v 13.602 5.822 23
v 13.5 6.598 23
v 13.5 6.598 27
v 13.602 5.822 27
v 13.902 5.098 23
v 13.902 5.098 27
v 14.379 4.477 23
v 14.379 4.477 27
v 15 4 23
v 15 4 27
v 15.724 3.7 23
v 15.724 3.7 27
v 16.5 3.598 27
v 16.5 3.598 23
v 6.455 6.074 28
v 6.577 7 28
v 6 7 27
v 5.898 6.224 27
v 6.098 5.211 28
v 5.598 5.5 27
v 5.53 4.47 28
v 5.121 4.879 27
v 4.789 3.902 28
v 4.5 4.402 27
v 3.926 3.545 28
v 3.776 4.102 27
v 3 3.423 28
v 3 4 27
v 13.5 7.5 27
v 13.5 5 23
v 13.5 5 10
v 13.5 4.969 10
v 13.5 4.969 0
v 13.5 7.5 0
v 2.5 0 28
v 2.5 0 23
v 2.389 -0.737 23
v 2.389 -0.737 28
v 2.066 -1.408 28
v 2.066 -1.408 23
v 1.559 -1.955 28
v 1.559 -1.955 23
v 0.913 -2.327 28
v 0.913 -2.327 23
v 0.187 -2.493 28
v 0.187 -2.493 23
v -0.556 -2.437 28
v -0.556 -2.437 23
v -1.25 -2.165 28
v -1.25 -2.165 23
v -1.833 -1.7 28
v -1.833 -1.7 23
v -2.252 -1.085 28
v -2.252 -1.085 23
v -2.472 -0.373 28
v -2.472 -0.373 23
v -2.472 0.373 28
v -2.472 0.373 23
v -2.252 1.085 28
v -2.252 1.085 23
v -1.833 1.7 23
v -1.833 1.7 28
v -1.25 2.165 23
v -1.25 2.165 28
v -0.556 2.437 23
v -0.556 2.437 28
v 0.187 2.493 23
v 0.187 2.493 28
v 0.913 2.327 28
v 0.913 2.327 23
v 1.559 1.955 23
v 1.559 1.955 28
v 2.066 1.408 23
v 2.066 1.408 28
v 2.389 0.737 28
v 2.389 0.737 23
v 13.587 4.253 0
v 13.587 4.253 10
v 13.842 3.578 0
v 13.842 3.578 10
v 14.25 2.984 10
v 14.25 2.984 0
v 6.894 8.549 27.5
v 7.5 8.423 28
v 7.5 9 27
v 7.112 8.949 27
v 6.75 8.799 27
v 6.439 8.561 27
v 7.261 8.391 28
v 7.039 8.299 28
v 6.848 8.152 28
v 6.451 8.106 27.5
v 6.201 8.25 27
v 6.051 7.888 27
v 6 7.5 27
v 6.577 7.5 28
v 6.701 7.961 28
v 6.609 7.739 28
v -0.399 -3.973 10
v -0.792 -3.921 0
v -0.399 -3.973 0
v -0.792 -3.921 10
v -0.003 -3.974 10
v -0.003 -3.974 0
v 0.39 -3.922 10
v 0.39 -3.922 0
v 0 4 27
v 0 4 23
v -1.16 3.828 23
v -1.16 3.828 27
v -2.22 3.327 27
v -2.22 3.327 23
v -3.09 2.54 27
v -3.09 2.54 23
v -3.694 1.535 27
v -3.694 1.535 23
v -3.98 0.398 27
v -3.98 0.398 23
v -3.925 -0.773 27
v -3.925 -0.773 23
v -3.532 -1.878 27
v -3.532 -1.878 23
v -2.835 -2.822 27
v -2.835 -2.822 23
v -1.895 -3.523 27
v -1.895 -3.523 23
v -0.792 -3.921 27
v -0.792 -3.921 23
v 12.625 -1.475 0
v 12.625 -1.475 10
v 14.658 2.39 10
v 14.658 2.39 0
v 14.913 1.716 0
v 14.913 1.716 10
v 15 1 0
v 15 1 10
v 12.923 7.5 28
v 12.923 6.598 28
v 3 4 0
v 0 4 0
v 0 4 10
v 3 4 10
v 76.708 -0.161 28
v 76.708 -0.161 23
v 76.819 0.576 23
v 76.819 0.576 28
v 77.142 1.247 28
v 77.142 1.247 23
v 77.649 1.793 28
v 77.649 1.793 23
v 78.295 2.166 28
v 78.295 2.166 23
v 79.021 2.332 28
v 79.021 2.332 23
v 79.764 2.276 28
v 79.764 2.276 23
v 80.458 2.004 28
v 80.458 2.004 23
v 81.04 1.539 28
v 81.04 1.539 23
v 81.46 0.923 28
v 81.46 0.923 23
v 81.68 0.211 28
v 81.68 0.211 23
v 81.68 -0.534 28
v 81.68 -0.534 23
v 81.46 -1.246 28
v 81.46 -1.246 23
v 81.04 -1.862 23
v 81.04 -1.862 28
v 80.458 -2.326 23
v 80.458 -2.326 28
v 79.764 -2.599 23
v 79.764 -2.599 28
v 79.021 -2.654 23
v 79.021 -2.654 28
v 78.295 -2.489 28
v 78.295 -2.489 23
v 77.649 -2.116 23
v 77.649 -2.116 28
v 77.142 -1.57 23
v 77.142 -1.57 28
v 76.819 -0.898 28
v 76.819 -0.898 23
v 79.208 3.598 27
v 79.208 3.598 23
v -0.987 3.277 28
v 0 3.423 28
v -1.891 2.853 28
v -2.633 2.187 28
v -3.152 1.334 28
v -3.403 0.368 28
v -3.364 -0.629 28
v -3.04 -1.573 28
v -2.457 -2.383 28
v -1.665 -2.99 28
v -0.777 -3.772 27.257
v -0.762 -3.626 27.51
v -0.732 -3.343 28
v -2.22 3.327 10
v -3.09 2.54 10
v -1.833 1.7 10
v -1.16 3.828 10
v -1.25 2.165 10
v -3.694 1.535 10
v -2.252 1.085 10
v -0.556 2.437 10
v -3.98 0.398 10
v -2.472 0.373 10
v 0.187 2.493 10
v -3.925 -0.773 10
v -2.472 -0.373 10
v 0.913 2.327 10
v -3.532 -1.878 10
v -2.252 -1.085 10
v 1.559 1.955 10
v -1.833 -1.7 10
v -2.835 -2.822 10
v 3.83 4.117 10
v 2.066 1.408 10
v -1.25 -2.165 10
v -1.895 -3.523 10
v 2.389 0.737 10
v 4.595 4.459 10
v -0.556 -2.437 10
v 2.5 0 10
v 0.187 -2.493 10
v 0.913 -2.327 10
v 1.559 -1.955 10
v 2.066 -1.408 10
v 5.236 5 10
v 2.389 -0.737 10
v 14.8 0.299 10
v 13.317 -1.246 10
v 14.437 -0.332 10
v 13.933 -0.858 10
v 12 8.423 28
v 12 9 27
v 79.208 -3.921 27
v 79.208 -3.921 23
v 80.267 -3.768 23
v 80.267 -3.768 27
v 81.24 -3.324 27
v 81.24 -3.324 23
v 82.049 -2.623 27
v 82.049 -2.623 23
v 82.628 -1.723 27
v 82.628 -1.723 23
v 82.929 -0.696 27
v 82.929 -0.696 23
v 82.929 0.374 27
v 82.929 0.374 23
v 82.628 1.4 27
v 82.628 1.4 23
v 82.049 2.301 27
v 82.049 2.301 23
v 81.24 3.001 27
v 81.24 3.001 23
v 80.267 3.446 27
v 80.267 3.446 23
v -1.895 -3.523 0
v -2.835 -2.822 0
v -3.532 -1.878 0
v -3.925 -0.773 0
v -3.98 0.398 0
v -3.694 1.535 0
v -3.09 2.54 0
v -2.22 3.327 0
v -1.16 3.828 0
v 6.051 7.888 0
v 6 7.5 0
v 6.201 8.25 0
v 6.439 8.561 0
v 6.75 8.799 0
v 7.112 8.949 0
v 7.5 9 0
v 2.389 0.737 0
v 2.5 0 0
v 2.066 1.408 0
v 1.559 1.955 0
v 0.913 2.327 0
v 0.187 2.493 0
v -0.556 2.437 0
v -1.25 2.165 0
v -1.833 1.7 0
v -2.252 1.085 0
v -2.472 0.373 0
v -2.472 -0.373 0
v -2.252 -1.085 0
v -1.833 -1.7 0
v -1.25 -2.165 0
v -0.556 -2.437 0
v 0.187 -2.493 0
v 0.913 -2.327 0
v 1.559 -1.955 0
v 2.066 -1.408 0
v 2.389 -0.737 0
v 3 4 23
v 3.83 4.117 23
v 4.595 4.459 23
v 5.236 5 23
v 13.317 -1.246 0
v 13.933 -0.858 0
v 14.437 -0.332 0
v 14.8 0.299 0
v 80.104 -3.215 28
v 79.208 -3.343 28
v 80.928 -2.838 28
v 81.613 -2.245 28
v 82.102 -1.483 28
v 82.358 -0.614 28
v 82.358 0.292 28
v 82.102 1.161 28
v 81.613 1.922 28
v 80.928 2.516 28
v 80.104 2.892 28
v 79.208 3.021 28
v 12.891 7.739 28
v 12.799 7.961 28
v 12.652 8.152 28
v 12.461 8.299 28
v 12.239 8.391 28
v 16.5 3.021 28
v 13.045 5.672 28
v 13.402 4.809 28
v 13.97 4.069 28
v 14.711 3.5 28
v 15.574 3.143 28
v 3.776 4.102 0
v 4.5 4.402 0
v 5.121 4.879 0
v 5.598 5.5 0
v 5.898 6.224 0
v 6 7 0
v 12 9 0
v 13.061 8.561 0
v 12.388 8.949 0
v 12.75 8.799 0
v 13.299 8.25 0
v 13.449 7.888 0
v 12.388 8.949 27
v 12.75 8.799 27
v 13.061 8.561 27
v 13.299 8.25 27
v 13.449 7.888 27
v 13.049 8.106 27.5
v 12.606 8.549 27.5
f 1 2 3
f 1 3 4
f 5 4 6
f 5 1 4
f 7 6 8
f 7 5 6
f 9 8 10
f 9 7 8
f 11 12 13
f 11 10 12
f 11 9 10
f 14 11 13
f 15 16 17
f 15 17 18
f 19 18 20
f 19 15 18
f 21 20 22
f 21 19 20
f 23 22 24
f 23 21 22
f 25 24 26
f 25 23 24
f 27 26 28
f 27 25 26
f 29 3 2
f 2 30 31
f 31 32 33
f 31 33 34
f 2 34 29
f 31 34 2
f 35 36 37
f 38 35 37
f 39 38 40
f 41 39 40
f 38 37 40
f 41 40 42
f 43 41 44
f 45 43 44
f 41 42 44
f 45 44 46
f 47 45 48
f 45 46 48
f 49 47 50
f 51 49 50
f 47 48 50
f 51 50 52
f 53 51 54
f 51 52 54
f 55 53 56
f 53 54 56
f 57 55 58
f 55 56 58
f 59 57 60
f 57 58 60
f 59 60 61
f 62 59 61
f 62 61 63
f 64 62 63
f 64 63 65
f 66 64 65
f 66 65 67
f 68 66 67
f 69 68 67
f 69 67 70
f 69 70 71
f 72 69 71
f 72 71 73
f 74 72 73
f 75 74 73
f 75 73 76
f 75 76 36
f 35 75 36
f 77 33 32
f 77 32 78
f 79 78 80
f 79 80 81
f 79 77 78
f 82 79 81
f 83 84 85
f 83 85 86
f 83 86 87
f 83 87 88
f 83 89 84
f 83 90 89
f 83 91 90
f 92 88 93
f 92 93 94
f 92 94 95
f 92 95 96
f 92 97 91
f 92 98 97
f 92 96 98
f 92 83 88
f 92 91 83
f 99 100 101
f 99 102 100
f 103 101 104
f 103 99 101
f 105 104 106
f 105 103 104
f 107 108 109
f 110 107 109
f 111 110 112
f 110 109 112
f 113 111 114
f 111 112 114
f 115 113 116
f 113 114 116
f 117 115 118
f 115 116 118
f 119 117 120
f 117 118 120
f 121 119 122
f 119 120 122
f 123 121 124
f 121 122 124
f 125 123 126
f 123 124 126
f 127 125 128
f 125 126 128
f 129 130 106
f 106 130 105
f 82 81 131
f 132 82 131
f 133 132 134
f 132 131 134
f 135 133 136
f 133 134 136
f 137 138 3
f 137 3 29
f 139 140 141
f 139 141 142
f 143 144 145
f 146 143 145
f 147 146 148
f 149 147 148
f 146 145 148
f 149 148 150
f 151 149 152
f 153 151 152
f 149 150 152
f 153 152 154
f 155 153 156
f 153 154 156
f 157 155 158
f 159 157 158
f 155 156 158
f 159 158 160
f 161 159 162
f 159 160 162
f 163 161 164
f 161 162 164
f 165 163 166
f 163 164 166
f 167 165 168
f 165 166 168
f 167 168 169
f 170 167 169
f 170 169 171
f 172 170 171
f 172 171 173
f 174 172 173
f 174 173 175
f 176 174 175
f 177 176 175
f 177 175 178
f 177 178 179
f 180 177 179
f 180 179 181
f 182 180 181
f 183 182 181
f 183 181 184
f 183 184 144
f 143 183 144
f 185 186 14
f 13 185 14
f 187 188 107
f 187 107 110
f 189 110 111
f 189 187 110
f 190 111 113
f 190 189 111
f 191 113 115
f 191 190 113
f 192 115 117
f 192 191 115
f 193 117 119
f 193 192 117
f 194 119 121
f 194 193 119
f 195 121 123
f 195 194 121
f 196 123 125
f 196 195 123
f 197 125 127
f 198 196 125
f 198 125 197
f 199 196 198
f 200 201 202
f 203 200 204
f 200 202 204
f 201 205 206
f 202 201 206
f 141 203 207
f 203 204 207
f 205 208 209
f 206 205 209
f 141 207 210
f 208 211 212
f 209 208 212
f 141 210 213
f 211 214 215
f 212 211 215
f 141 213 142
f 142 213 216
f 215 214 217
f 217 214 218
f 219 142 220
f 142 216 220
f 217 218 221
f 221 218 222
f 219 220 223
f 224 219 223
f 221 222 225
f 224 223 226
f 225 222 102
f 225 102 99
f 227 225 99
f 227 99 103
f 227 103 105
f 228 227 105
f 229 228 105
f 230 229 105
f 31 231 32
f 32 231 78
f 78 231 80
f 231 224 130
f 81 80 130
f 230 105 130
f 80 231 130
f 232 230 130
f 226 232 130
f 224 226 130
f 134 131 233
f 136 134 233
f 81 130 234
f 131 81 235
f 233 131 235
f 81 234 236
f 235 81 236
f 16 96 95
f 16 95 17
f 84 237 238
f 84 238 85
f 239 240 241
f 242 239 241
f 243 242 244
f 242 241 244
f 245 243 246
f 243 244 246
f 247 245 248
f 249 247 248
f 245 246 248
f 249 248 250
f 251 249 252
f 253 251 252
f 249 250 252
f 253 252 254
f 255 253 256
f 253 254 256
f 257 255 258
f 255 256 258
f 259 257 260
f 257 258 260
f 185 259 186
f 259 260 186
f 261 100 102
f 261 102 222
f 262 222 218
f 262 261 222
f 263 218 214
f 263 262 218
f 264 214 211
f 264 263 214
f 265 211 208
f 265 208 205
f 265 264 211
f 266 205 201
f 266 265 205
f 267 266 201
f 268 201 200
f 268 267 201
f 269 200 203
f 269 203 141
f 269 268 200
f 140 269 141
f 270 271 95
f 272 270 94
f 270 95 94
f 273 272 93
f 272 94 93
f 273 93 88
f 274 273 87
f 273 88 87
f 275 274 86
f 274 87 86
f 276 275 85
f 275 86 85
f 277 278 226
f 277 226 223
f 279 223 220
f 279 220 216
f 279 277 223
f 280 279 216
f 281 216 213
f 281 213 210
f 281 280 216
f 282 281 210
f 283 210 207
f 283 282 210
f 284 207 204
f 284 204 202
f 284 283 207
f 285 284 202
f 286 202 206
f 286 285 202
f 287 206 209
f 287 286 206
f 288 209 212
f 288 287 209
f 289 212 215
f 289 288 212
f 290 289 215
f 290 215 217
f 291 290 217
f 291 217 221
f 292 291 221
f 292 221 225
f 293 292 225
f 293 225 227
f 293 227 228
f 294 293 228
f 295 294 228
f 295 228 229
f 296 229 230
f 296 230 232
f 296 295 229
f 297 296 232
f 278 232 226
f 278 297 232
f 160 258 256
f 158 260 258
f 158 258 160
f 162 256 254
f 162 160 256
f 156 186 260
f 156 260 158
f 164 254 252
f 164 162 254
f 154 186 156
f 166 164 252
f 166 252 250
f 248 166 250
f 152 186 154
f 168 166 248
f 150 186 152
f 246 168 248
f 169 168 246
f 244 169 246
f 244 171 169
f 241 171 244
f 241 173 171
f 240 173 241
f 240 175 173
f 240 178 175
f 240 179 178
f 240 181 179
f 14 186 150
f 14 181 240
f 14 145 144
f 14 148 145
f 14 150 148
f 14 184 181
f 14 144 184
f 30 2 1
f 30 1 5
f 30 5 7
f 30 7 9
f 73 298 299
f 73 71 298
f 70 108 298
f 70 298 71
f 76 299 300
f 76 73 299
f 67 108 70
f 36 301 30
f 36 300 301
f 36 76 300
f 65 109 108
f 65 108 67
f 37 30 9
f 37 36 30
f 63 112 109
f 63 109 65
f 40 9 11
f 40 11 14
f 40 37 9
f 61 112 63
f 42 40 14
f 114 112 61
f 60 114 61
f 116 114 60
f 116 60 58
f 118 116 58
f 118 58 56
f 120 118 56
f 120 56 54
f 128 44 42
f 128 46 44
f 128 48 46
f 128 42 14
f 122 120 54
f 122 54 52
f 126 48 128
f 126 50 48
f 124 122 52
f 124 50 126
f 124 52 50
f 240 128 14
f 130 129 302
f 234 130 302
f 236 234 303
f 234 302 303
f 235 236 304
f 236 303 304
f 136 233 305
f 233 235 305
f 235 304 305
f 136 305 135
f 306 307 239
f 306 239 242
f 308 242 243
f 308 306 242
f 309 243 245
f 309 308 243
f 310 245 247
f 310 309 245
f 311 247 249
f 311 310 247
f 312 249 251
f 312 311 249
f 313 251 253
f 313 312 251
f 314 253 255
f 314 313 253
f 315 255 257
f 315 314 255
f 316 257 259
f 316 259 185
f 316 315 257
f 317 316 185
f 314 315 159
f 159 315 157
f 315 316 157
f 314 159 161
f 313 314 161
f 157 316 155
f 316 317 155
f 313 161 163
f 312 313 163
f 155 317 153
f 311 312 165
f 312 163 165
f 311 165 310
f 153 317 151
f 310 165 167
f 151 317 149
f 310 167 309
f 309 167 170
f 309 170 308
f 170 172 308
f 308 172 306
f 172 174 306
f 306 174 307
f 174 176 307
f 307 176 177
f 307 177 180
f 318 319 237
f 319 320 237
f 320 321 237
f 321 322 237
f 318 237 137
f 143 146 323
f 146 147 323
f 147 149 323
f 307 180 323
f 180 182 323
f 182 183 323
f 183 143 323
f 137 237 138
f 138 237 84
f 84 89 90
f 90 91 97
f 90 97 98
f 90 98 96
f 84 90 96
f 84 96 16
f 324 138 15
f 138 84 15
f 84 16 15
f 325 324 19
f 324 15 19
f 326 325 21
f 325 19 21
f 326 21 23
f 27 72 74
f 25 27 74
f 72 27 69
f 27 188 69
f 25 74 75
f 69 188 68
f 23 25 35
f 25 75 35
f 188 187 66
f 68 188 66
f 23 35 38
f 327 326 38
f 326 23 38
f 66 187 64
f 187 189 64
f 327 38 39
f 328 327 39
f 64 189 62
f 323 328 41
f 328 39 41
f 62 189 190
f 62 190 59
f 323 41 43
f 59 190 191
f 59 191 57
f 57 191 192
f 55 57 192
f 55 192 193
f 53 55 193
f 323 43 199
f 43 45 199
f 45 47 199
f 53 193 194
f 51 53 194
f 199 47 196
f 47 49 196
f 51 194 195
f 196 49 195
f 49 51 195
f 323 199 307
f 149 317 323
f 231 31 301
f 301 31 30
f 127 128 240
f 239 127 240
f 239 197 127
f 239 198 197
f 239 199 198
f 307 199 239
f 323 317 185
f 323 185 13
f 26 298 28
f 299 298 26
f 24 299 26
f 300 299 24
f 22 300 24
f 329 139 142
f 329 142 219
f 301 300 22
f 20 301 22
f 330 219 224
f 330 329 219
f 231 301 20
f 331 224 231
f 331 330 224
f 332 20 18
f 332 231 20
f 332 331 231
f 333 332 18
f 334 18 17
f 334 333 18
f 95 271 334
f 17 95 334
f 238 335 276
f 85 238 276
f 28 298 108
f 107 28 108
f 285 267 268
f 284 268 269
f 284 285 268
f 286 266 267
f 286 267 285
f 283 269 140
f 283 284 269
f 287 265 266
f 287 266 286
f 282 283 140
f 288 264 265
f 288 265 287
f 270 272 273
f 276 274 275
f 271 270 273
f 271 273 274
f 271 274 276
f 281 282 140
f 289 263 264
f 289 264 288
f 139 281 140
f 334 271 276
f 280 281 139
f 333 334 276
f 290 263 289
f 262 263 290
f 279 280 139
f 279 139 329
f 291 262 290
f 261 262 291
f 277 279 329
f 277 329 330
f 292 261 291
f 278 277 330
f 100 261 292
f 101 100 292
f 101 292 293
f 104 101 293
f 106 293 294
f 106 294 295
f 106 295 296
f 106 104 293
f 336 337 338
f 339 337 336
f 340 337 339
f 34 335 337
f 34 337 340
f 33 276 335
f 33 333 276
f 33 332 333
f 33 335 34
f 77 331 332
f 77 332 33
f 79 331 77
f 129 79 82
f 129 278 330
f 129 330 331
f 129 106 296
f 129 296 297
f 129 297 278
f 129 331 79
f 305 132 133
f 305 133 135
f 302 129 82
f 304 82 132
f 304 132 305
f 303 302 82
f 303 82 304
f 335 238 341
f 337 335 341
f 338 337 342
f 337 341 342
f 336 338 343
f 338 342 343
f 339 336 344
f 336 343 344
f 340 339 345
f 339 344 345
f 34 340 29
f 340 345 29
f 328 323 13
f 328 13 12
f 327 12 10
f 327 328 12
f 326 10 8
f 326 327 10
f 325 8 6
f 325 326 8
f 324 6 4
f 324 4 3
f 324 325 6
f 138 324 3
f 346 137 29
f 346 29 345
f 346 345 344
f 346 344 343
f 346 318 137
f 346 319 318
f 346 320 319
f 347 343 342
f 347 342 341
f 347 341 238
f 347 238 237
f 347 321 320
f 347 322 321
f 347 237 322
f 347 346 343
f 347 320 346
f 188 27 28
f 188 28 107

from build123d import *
from OCP.BRepFilletAPI import BRepFilletAPI_MakeChamfer

# Parameters (mm, degrees)
SKETCH1_R                       = 2.5
BOSS_EXTRUDE1_DEPTH             = 10
FILLET1_R                       = 3
CUT_EXTRUDE1_DEPTH              = 19.466185313
FILLET2_R                       = 3
FILLET3_R                       = 3
BOSS_EXTRUDE2_DEPTH             = 3
BOSS_EXTRUDE2_DEPTH_BACK        = 2
SKETCH3_W                       = 7.5
SKETCH3_H                       = 10
BOSS_EXTRUDE3_DEPTH             = 13
BOSS_EXTRUDE3_DIRECTION_2_REACH = 21.339
BOSS_EXTRUDE4_DEPTH             = 5
SKETCH6_R                       = 2.5
CUT_EXTRUDE2_DEPTH              = 87.565417468
FILLET5_R                       = 3
FILLET6_R                       = 1.5
CHAMFER1_SIZE                   = 1
CHAMFER1_SIZE2                  = 0.577350269


with BuildPart() as part:
    # Sketch1 → Boss-Extrude1 (new body)
    with BuildSketch(Plane.XY):
        with BuildLine():
            Line((0, 4), (15, 4))
            Line((15, 4), (15, -4))
            Line((15, -4), (0, -4))
            ThreePointArc((0, -4), (-4, 0), (0, 4))
        make_face()
        Circle(SKETCH1_R, mode=Mode.SUBTRACT)
    extrude(amount=BOSS_EXTRUDE1_DEPTH)

    # Fillet1
    fillet1_edges = [part.edges().sort_by_distance(p)[0] for p in [
        (15, 4, 5),
        (15, -4, 5),
    ]]
    fillet(fillet1_edges, radius=FILLET1_R)

    # Sketch2 → Cut-Extrude1 (cut, through all)
    with BuildSketch(Plane.XY.offset(10)):
        Polygon((15, -1), (0, -4), (15, -4), align=None)
    extrude(amount=-CUT_EXTRUDE1_DEPTH, mode=Mode.SUBTRACT)

    # Fillet2
    # the kernel refuses this fillet: 3 mm, written as the material it takes off along each edge
    with BuildSketch(Plane(origin=(15, -1, -6.055404624), x_dir=(-0.9805806756909201, -0.19611613513818393, 0), z_dir=(0, 0, 1))) as fillet2_piece_1:
        with BuildLine():
            CenterArc((2.42216185, -3), FILLET2_R, 90, 69.740076193)
            Line((-0.39223227, -1.961161351), (-0.448520153, -1.940384578))
            ThreePointArc((-0.448520153, -1.940384578), (-0.254950976, -0.968813708), (-0.058834841, 0.011766968))
            Line((-0.058834841, 0.011766968), (0, 0.06))
            Line((0, 0.06), (2.42216185, 0.06))
            Line((2.42216185, 0.06), (2.42216185, 0))
        make_face()
    extrude(amount=22.110809248, mode=Mode.SUBTRACT)

    # Fillet3
    fillet3_edges = [part.edges().sort_by_distance(p)[0] for p in [
        (0, -4, 5),
    ]]
    fillet(fillet3_edges, radius=FILLET3_R)

    # Sketch3 → Boss-Extrude2 (add, two sides: drawn at the far end of the back side and taken through both)
    with BuildSketch(Plane(origin=(0, 4, 0), x_dir=(1, 0, 0), z_dir=(0, 1, 0)).offset(-BOSS_EXTRUDE2_DEPTH_BACK)):
        with Locations((9.75, -5)):
            Rectangle(SKETCH3_W, SKETCH3_H)
    extrude(amount=BOSS_EXTRUDE2_DEPTH + BOSS_EXTRUDE2_DEPTH_BACK)

    # Sketch4 → Boss-Extrude3 (add)
    with BuildSketch(Plane.XY.offset(10)):
        Polygon((6, 7), (6, 9), (13.5, 9), (13.5, 7), (13.5, 5), (6, 5), align=None)
    extrude(amount=BOSS_EXTRUDE3_DEPTH)

    # Boss-Extrude3 direction 2: up to this face of the body (flat: up to its plane)
    boss_extrude3_direction_2_end = Plane(part.part.faces().sort_by_distance((6.608331714, 1.519169976, 0))[0])
    # Sketch4 → Boss-Extrude3 direction 2 (add, up to the picked face)
    with BuildSketch(Plane.XY.offset(10), mode=Mode.PRIVATE) as boss_extrude3_direction_2_sk1:
        Polygon((6, 7), (6, 9), (13.5, 9), (13.5, 7), (13.5, 5), (6, 5), align=None)
    boss_extrude3_direction_2_tool1 = split(extrude(boss_extrude3_direction_2_sk1.sketch, amount=-BOSS_EXTRUDE3_DIRECTION_2_REACH, mode=Mode.PRIVATE), bisect_by=boss_extrude3_direction_2_end, keep=Keep.BOTH, mode=Mode.PRIVATE)
    add(boss_extrude3_direction_2_tool1.solids().sort_by(Axis((9.75, 7, 10), (0, 0, -1)))[0])

    # Sketch5 → Boss-Extrude4 (add)
    with BuildSketch(Plane.XY.offset(23)):
        with BuildLine():
            Line((13.5, 3.598076211), (13.5, 5))
            Line((13.5, 5), (13.5, 9))
            Line((13.5, 9), (6, 9))
            Line((6, 9), (6, 5))
            Line((6, 5), (6, 4))
            Line((6, 4), (0, 4))
            ThreePointArc((0, 4), (-3.980145848, 0.398044003), (-0.792136593, -3.920780486))
            Line((-0.792136593, -3.920780486), (79.207863407, -3.920780486))
            ThreePointArc((79.207863407, -3.920780486), (82.967291756, -0.161352137), (79.207863407, 3.598076211))
            Line((79.207863407, 3.598076211), (13.5, 3.598076211))
        make_face()
    extrude(amount=BOSS_EXTRUDE4_DEPTH)

    # Sketch6 → Cut-Extrude2 (cut, through all)
    with BuildSketch(Plane(origin=(0, 0, 23), x_dir=(-1, 0, 0), z_dir=(0, 0, -1))):
        with Locations(Location((0, 0, 0), (0, 0, 180))):
            Circle(SKETCH6_R)
        with Locations((-79.207863407, -0.161352137)):
            Circle(SKETCH6_R)
    extrude(amount=-CUT_EXTRUDE2_DEPTH, mode=Mode.SUBTRACT)

    # Fillet5
    # the kernel refuses this fillet: 3 mm, written as the material it adds along each edge
    with BuildSketch(Plane(origin=(13.5, 3.598076211, 23), x_dir=(0, 1, 0), z_dir=(0, 0, 1))) as fillet5_piece_1:
        with BuildLine():
            CenterArc((FILLET5_R, -FILLET5_R), FILLET5_R, 90, 90)
            Line((0, -FILLET5_R), (0, 0))
            Line((0, 0), (FILLET5_R, 0))
        make_face()
    extrude(amount=5)
    with BuildSketch(Plane(origin=(6, 4, 15.5), x_dir=(0, 1, 0), z_dir=(0, 0, 1))) as fillet5_piece_2_section:
        with BuildLine():
            CenterArc((FILLET5_R, FILLET5_R), FILLET5_R, 180, 90)
            Line((0, FILLET5_R), (0, 0))
            Line((0, 0), (FILLET5_R, 0))
        make_face()
    fillet5_piece_2 = extrude(amount=12.5, mode=Mode.PRIVATE)
    fillet5_piece_2 = split(fillet5_piece_2, bisect_by=Plane(origin=(6, 5, 15.5), z_dir=(0, 1, 0)), keep=Keep.TOP, mode=Mode.PRIVATE)
    add(fillet5_piece_2)
    with BuildSketch(Plane(origin=(6, 4, 23), x_dir=(0, 1, 0), z_dir=(0, 0, 1))) as fillet5_piece_3:
        with BuildLine():
            CenterArc((FILLET5_R, FILLET5_R), FILLET5_R, 180, 90)
            Line((0, FILLET5_R), (0, 0))
            Line((0, 0), (FILLET5_R, 0))
        make_face()
    extrude(amount=5)
    with BuildSketch(Plane(origin=(13.5, 3.598076211, 0), x_dir=(0, 1, 0), z_dir=(0, 0, 1))) as fillet5_piece_4:
        with BuildLine():
            CenterArc((1.370550755, -3), FILLET5_R, 90, 41.409622109)
            ThreePointArc((-0.613762728, -0.75), (-0.276396038, -0.399947676), (0, 0))
            Line((0, 0), (1.370550755, 0))
        make_face()
    extrude(amount=10)
    with BuildSketch(Plane(origin=(6, 4, 0), x_dir=(-1, 0, 0), z_dir=(0, 0, 1))) as fillet5_piece_5:
        with BuildLine():
            CenterArc((FILLET5_R, -FILLET5_R), FILLET5_R, 90, 90)
            Line((0, -FILLET5_R), (0, 0))
            Line((0, 0), (FILLET5_R, 0))
        make_face()
    extrude(amount=10)
    with BuildSketch(Plane(origin=(6, 4, -7.5), x_dir=(-1, 0, 0), z_dir=(0, 0, 1))) as fillet5_piece_6_section:
        with BuildLine():
            CenterArc((FILLET5_R, -FILLET5_R), FILLET5_R, 90, 90)
            Line((0, -FILLET5_R), (0, 0))
            Line((0, 0), (FILLET5_R, 0))
        make_face()
    fillet5_piece_6 = extrude(amount=25, mode=Mode.PRIVATE)
    fillet5_piece_6 = split(fillet5_piece_6, bisect_by=Plane(origin=(6, 4, 10), z_dir=(0, 0, 1)), keep=Keep.TOP, mode=Mode.PRIVATE)
    fillet5_piece_6 = split(fillet5_piece_6, bisect_by=Plane(origin=(6, 5, -7.5), z_dir=(0, 1, 0)), keep=Keep.TOP, mode=Mode.PRIVATE)
    add(fillet5_piece_6)

    # Fillet6
    fillet6_edges = [part.edges().sort_by_distance(p)[0] for p in [
        (6, 9, 14),
        (13.5, 9, 14),
    ]]
    fillet(fillet6_edges, radius=FILLET6_R)

    # Chamfer1: one chamfer whose edges measure the first distance from different faces: ONE call of the kernel's chamfer builder (chamfer() names one face for all edges)
    chamfer1_edges_1 = [part.edges().sort_by_distance(p)[0] for p in [
        (47.853931704, 3.598076211, 28),
    ]]
    chamfer1_side_1 = [part.faces().sort_by_distance(p)[0] for p in [
        (47.853931704, 3.598076211, 25.5),
    ]]
    chamfer1_edges_2 = [part.edges().sort_by_distance(p)[0] for p in [
        (-3.980145848, 0.398044003, 28),
    ]]
    chamfer1_side_2 = [part.faces().sort_by_distance(p)[0] for p in [
        (-3.980145848, 0.398044003, 25.5),
    ]]
    chamfer1_edges_3 = [part.edges().sort_by_distance(p)[0] for p in [
        (39.207863407, -3.920780486, 28),
    ]]
    chamfer1_side_3 = [part.faces().sort_by_distance(p)[0] for p in [
        (39.207863407, -3.920780486, 25.5),
    ]]
    chamfer1_edges_4 = [part.edges().sort_by_distance(p)[0] for p in [
        (82.967291756, -0.161352137, 28),
    ]]
    chamfer1_side_4 = [part.faces().sort_by_distance(p)[0] for p in [
        (82.967291756, -0.161352137, 25.5),
    ]]
    chamfer1_edges_5 = [part.edges().sort_by_distance(p)[0] for p in [
        (13.5, 7.049038106, 28),
    ]]
    chamfer1_side_5 = [part.faces().sort_by_distance(p)[0] for p in [
        (13.5, 6.301445777, 12.480297412),
    ]]
    chamfer1_edges_6 = [part.edges().sort_by_distance(p)[0] for p in [
        (1.5, 4, 28),
    ]]
    chamfer1_side_6 = [part.faces().sort_by_distance(p)[0] for p in [
        (1.5, 4, 25.5),
    ]]
    chamfer1_edges_7 = [part.edges().sort_by_distance(p)[0] for p in [
        (14.378679656, 4.476755868, 28),
    ]]
    chamfer1_side_7 = [part.faces().sort_by_distance(p)[0] for p in [
        (14.378679656, 4.476755868, 25.5),
    ]]
    chamfer1_edges_8 = [part.edges().sort_by_distance(p)[0] for p in [
        (5.121320344, 4.878679656, 28),
    ]]
    chamfer1_side_8 = [part.faces().sort_by_distance(p)[0] for p in [
        (5.121320344, 4.878679656, 14),
    ]]
    chamfer1_edges_9 = [part.edges().sort_by_distance(p)[0] for p in [
        (9.75, 9, 28),
    ]]
    chamfer1_side_9 = [part.faces().sort_by_distance(p)[0] for p in [
        (9.75, 9, 14),
    ]]
    chamfer1_edges_10 = [part.edges().sort_by_distance(p)[0] for p in [
        (6, 7.25, 28),
    ]]
    chamfer1_side_10 = [part.faces().sort_by_distance(p)[0] for p in [
        (6, 7.25, 14),
    ]]
    chamfer1_edges_11 = [part.edges().sort_by_distance(p)[0] for p in [
        (13.060660172, 8.560660172, 28),
    ]]
    chamfer1_side_11 = [part.faces().sort_by_distance(p)[0] for p in [
        (13.060660172, 8.560660172, 14),
    ]]
    chamfer1_edges_12 = [part.edges().sort_by_distance(p)[0] for p in [
        (6.439339828, 8.560660172, 28),
    ]]
    chamfer1_side_12 = [part.faces().sort_by_distance(p)[0] for p in [
        (6.439339828, 8.560660172, 14),
    ]]
    chamfer1 = BRepFilletAPI_MakeChamfer(part.part.solid().wrapped)
    for e in chamfer1_edges_1:
        chamfer1.Add(CHAMFER1_SIZE, CHAMFER1_SIZE2, e.wrapped, chamfer1_side_1[0].wrapped)  # the first distance lies on this face
    for e in chamfer1_edges_2:
        chamfer1.Add(CHAMFER1_SIZE, CHAMFER1_SIZE2, e.wrapped, chamfer1_side_2[0].wrapped)  # the first distance lies on this face
    for e in chamfer1_edges_3:
        chamfer1.Add(CHAMFER1_SIZE, CHAMFER1_SIZE2, e.wrapped, chamfer1_side_3[0].wrapped)  # the first distance lies on this face
    for e in chamfer1_edges_4:
        chamfer1.Add(CHAMFER1_SIZE, CHAMFER1_SIZE2, e.wrapped, chamfer1_side_4[0].wrapped)  # the first distance lies on this face
    for e in chamfer1_edges_5:
        chamfer1.Add(CHAMFER1_SIZE, CHAMFER1_SIZE2, e.wrapped, chamfer1_side_5[0].wrapped)  # the first distance lies on this face
    for e in chamfer1_edges_6:
        chamfer1.Add(CHAMFER1_SIZE, CHAMFER1_SIZE2, e.wrapped, chamfer1_side_6[0].wrapped)  # the first distance lies on this face
    for e in chamfer1_edges_7:
        chamfer1.Add(CHAMFER1_SIZE, CHAMFER1_SIZE2, e.wrapped, chamfer1_side_7[0].wrapped)  # the first distance lies on this face
    for e in chamfer1_edges_8:
        chamfer1.Add(CHAMFER1_SIZE, CHAMFER1_SIZE2, e.wrapped, chamfer1_side_8[0].wrapped)  # the first distance lies on this face
    for e in chamfer1_edges_9:
        chamfer1.Add(CHAMFER1_SIZE, CHAMFER1_SIZE2, e.wrapped, chamfer1_side_9[0].wrapped)  # the first distance lies on this face
    for e in chamfer1_edges_10:
        chamfer1.Add(CHAMFER1_SIZE, CHAMFER1_SIZE2, e.wrapped, chamfer1_side_10[0].wrapped)  # the first distance lies on this face
    for e in chamfer1_edges_11:
        chamfer1.Add(CHAMFER1_SIZE, CHAMFER1_SIZE2, e.wrapped, chamfer1_side_11[0].wrapped)  # the first distance lies on this face
    for e in chamfer1_edges_12:
        chamfer1.Add(CHAMFER1_SIZE, CHAMFER1_SIZE2, e.wrapped, chamfer1_side_12[0].wrapped)  # the first distance lies on this face
    add(Compound.cast(chamfer1.Shape()), mode=Mode.REPLACE)


solid = part.part
